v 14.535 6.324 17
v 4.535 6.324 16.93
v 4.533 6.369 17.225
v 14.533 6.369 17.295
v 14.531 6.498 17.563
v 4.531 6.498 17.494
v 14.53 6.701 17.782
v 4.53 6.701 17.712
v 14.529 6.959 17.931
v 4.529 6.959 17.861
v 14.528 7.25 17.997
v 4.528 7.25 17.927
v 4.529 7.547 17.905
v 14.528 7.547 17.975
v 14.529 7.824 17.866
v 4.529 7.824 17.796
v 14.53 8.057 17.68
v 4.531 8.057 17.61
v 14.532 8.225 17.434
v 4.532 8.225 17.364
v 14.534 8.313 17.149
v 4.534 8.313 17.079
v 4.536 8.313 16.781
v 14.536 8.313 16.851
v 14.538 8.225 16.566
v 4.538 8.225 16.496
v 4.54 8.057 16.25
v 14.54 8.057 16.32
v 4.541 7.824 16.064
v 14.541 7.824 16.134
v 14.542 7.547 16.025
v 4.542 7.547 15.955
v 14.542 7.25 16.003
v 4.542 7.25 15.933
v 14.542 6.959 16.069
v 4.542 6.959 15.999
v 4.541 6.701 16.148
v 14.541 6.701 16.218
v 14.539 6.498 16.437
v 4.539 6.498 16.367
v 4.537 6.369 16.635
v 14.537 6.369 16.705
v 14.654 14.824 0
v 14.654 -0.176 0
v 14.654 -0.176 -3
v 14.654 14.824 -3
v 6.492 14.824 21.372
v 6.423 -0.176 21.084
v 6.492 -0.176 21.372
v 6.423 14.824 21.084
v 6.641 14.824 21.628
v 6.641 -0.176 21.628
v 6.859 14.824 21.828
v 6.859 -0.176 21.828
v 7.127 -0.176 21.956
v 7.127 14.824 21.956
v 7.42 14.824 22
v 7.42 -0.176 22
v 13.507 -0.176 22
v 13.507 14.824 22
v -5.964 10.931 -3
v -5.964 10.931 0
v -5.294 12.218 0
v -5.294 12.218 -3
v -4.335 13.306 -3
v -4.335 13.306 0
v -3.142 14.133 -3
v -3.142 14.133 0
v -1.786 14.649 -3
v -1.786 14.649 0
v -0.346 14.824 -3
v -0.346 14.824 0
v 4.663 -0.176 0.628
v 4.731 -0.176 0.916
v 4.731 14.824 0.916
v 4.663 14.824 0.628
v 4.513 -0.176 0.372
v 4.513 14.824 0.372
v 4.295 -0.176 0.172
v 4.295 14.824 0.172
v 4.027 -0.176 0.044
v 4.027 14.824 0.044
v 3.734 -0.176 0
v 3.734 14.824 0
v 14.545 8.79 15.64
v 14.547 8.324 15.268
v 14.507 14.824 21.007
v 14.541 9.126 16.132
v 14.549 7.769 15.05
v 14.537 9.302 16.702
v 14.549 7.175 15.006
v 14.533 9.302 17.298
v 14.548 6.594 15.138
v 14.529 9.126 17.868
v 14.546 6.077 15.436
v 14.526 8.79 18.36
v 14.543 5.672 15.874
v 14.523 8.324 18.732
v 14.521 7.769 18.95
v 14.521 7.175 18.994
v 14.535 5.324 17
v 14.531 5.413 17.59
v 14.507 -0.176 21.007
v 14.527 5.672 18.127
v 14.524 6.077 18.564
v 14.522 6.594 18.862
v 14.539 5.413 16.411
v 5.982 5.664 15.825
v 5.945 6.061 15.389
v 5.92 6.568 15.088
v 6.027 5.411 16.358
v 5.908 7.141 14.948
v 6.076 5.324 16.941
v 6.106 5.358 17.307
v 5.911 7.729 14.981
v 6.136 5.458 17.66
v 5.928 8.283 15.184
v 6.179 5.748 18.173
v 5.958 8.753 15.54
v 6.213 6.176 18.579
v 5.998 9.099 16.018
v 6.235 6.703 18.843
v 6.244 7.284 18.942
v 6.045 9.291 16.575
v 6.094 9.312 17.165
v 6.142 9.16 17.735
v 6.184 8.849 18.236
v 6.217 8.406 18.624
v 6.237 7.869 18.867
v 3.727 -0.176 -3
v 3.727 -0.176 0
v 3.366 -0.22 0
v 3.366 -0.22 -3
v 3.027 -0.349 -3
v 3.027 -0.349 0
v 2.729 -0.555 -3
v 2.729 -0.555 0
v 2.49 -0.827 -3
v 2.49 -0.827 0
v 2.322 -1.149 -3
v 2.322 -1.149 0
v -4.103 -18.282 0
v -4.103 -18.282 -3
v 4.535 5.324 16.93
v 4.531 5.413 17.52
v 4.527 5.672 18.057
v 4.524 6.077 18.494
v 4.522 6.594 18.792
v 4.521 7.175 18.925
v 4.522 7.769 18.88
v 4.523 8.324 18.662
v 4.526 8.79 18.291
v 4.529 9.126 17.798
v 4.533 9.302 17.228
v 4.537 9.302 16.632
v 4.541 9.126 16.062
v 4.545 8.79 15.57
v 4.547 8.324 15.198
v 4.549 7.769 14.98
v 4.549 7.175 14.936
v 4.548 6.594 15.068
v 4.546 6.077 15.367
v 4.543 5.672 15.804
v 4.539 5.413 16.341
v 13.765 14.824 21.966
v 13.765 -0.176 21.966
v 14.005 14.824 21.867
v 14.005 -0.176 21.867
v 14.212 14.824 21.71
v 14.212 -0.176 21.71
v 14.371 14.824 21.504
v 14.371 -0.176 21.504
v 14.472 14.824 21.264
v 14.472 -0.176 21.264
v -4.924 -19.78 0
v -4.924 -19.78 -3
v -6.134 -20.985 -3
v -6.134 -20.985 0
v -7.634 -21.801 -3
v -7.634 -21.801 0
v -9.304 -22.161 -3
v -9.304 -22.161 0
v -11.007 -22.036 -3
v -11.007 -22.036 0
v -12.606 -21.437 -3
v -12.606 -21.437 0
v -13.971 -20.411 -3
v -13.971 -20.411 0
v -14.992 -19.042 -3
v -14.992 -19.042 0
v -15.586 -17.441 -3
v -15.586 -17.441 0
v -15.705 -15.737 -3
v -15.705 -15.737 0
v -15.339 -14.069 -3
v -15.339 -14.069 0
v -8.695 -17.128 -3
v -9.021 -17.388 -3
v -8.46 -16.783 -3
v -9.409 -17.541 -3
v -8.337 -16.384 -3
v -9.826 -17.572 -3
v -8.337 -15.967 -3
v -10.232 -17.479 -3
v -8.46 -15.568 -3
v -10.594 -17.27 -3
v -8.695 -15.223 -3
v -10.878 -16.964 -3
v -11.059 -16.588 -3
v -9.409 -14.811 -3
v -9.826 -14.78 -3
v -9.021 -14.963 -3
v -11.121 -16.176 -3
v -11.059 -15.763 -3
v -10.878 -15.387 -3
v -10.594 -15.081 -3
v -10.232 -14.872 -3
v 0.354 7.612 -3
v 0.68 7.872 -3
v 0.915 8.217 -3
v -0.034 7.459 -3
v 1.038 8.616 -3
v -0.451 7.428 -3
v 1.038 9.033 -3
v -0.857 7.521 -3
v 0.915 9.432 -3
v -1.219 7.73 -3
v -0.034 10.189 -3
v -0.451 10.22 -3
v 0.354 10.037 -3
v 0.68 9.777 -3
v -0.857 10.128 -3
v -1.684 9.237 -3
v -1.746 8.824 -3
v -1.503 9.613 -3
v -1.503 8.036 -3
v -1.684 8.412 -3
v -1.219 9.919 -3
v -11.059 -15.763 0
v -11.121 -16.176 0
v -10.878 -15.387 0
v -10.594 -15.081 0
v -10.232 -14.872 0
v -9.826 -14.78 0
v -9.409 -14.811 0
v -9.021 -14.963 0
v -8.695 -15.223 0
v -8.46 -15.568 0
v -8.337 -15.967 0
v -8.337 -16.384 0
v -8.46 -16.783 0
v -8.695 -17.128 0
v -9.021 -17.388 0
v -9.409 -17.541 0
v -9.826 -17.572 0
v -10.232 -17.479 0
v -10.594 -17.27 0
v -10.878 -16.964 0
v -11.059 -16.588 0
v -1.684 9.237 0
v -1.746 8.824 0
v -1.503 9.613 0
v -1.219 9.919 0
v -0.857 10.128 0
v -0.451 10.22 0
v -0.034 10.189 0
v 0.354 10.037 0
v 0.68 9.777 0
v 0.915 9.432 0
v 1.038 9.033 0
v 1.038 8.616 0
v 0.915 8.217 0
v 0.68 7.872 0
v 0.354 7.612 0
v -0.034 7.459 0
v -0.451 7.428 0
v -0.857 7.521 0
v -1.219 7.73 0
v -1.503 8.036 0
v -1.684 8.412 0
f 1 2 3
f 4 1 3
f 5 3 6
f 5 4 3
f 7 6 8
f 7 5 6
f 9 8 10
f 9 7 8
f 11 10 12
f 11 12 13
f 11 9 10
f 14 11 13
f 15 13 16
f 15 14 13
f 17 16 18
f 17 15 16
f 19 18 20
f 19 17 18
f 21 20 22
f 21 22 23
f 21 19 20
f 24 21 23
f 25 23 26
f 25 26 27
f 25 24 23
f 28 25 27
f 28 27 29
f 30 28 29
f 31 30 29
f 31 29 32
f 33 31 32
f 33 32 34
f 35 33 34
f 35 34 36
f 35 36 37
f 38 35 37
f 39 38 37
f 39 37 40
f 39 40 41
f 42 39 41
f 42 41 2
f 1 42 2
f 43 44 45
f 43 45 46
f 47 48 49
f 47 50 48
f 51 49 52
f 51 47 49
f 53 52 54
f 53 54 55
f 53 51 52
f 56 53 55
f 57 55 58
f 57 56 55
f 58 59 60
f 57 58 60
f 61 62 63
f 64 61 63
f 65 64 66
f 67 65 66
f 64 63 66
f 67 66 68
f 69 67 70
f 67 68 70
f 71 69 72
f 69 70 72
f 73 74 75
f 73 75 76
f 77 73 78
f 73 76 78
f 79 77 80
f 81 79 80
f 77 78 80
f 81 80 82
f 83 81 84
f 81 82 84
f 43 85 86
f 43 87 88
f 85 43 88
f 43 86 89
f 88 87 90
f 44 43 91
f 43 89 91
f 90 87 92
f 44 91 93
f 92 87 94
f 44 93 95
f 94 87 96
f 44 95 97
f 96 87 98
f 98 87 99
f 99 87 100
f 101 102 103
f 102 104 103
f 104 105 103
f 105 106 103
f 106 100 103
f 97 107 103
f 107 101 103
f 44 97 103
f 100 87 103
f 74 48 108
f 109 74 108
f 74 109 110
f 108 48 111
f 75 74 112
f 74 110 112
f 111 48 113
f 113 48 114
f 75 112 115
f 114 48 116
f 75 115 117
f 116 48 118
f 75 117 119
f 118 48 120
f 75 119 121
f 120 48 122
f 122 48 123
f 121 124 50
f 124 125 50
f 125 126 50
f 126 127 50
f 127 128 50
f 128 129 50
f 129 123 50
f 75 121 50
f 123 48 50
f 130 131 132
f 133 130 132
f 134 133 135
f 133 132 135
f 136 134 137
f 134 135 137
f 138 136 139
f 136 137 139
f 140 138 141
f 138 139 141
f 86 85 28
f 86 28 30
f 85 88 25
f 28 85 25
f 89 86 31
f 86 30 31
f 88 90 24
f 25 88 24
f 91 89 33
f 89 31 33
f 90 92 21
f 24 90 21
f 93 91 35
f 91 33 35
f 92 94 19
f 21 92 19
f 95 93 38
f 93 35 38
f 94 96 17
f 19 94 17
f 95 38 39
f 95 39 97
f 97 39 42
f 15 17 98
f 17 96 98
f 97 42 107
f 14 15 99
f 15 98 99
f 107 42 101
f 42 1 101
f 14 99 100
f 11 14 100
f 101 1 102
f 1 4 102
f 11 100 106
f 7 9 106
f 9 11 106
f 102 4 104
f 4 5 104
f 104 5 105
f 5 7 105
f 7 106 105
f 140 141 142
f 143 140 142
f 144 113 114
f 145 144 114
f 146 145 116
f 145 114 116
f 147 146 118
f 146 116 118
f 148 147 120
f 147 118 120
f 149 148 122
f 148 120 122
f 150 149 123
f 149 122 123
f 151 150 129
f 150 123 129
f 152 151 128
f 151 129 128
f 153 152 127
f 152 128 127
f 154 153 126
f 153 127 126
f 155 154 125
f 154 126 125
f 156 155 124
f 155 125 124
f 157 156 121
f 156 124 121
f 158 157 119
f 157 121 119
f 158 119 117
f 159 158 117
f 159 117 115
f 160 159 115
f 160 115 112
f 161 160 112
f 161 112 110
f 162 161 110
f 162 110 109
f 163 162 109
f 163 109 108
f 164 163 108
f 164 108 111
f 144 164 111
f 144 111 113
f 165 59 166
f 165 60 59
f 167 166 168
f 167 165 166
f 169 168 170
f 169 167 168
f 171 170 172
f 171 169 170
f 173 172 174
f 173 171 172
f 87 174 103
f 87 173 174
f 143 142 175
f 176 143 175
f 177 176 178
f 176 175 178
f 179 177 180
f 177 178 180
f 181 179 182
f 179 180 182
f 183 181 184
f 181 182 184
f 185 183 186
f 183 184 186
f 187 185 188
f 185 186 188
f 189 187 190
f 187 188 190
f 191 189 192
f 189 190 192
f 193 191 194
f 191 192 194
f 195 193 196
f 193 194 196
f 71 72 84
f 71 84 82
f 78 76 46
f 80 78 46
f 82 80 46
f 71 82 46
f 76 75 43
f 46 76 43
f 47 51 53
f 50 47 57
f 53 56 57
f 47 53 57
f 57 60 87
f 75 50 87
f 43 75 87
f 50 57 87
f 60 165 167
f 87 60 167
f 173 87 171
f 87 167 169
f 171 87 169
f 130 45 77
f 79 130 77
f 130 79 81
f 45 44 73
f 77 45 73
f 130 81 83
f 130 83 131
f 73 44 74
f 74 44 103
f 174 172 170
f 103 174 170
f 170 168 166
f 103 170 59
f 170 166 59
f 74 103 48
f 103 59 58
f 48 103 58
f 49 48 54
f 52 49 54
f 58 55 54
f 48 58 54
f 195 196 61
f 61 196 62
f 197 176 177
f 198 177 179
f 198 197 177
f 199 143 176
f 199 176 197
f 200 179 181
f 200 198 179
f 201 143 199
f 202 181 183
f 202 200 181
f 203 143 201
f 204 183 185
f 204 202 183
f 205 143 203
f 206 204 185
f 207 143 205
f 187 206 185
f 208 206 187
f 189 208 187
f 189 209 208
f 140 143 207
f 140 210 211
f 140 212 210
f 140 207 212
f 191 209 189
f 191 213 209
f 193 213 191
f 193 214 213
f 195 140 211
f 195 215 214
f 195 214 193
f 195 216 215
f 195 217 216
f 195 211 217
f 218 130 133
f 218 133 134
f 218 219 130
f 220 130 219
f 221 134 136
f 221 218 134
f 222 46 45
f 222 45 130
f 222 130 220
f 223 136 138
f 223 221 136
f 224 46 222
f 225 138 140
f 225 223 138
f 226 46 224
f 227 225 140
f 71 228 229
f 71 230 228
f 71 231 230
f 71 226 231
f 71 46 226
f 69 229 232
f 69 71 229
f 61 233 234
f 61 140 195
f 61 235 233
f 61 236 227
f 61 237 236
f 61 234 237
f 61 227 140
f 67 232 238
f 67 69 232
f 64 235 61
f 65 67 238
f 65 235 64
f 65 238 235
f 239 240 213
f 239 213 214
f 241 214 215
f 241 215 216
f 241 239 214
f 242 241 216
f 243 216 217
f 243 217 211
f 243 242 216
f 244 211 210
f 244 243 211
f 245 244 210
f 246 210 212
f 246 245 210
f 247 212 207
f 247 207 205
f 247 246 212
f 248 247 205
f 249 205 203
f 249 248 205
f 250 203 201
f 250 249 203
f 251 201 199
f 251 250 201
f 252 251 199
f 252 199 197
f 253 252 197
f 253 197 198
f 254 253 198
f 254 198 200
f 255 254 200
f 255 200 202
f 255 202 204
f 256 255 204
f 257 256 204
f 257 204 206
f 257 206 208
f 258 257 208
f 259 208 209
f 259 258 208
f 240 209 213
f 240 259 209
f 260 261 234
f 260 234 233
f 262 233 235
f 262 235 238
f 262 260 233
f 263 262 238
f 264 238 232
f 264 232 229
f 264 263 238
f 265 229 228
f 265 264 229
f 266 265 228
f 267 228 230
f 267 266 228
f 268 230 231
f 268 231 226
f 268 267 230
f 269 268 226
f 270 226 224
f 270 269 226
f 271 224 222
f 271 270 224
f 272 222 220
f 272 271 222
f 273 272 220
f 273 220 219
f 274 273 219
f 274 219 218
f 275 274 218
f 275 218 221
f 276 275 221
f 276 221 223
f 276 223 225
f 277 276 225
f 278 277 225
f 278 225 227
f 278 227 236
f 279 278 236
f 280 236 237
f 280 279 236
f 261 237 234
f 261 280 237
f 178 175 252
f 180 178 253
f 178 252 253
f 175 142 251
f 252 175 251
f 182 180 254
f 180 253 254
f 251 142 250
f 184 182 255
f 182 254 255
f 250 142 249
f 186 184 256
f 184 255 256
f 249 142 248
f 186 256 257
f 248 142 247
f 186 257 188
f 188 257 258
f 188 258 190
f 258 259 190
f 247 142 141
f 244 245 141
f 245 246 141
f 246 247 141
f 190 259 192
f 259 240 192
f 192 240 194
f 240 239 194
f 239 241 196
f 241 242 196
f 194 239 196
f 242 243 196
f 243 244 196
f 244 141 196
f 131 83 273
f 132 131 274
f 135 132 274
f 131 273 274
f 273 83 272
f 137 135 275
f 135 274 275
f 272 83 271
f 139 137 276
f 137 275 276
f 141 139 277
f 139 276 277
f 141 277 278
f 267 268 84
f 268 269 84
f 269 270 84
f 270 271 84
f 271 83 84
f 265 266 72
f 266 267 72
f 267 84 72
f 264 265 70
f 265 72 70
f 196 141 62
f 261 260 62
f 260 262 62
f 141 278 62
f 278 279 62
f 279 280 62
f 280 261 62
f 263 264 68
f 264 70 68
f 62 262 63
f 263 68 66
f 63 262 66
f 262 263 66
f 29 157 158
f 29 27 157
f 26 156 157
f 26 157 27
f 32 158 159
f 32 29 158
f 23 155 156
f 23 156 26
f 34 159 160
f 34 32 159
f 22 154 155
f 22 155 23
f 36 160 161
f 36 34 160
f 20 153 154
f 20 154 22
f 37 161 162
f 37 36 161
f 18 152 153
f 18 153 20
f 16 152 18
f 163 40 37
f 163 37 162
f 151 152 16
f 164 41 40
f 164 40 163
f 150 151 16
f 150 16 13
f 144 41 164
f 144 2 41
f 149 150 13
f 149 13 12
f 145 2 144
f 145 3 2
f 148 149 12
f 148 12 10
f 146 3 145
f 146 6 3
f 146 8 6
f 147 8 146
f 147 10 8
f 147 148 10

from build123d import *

# Parameters (mm, degrees)
F0_R     = 1.4
F0_W     = 10
F0_H     = 15
F3_DEPTH = 3
F2_W     = 8
F2_H     = 15
F5_R     = 2
F5_R_2   = 1
F6_DEPTH = 10
F7_DEPTH = 15
F8_R     = 1


with BuildPart() as f3:
    # F0 (on Top) → F3 (new body)
    with BuildSketch(Plane.XY):
        with BuildLine():
            Line((-2.3220218662, -1.1490219488), (4.1030128133, -18.2824477607))
            ThreePointArc((4.1030128133, -18.2824477607), (11.8277285282, -21.7936821766), (15.3389629441, -14.0689664616))
            Line((15.3389629441, -14.0689664616), (5.9639629441, 10.9310335384))
            ThreePointArc((5.9639629441, 10.9310335384), (3.7635569052, 13.7558465942), (0.3459878787, 14.8242928889))
            Line((0.3459878787, 14.8242928889), (-4.6540121213, 14.8242928889))
            Line((-4.6540121213, 14.8242928889), (-4.6540121213, -0.1757071111))
            Line((-4.6540121213, -0.1757071111), (-3.7265156326, -0.1757071111))
            ThreePointArc((-3.7265156326, -0.1757071111), (-2.8721233759, -0.4428186848), (-2.3220218662, -1.1490219488))
        make_face()
        with Locations((9.7209878787, -16.1757071111)):
            Circle(F0_R, mode=Mode.SUBTRACT)
        with Locations((0.3459878787, 8.8242928889)):
            Circle(F0_R, mode=Mode.SUBTRACT)
        with Locations((-9.6540121213, 7.3242928889)):
            Rectangle(F0_W, F0_H)
    extrude(amount=-F3_DEPTH)

    # F0 (on Top) → F4 section 0
    with BuildSketch(Plane.XY):
        with Locations((-9.6540121213, 7.3242928889)):
            Rectangle(F0_W, F0_H)
    # F2 (on offset) → F4 section 1
    with BuildSketch(Plane.XY.offset(22)):
        with Locations((-10.5001659675, 7.3242928889)):
            Rectangle(F2_W, F2_H)
    loft()

    # F5 (on face) → F6 (join)
    with BuildSketch(Plane(origin=(-14.6532955437, 0, 0.1024705982), x_dir=(0, -1, 0), z_dir=(-0.9999755498, 0, 0.006992836))):
        with Locations((-7.3242928889, 16.8980648133)):
            Circle(F5_R)
        with Locations((-7.3242928889, 16.8980648133)):
            Circle(F5_R_2, mode=Mode.SUBTRACT)
    extrude(amount=-F6_DEPTH)

    # F5 (on face) → F7 (cut)
    with BuildSketch(Plane(origin=(-14.6532955437, 0, 0.1024705982), x_dir=(0, -1, 0), z_dir=(-0.9999755498, 0, 0.006992836))):
        with Locations((-7.3242928889, 16.8980648133)):
            Circle(F5_R_2)
    extrude(amount=-F7_DEPTH, mode=Mode.SUBTRACT)

    # F8
    f8_edges = [f3.edges().sort_by_distance(p)[0] for p in [
        (-6.500166, 7.324293, 22),
        (-14.500166, 7.324293, 22),
        (-4.654012, 7.324293, 0),
    ]]
    fillet(f8_edges, radius=F8_R)


with BuildPart() as f9_1:
    # F9: instance of F3
    add(f3.part.mirror(Plane.YZ))


solid = f9_1.part
